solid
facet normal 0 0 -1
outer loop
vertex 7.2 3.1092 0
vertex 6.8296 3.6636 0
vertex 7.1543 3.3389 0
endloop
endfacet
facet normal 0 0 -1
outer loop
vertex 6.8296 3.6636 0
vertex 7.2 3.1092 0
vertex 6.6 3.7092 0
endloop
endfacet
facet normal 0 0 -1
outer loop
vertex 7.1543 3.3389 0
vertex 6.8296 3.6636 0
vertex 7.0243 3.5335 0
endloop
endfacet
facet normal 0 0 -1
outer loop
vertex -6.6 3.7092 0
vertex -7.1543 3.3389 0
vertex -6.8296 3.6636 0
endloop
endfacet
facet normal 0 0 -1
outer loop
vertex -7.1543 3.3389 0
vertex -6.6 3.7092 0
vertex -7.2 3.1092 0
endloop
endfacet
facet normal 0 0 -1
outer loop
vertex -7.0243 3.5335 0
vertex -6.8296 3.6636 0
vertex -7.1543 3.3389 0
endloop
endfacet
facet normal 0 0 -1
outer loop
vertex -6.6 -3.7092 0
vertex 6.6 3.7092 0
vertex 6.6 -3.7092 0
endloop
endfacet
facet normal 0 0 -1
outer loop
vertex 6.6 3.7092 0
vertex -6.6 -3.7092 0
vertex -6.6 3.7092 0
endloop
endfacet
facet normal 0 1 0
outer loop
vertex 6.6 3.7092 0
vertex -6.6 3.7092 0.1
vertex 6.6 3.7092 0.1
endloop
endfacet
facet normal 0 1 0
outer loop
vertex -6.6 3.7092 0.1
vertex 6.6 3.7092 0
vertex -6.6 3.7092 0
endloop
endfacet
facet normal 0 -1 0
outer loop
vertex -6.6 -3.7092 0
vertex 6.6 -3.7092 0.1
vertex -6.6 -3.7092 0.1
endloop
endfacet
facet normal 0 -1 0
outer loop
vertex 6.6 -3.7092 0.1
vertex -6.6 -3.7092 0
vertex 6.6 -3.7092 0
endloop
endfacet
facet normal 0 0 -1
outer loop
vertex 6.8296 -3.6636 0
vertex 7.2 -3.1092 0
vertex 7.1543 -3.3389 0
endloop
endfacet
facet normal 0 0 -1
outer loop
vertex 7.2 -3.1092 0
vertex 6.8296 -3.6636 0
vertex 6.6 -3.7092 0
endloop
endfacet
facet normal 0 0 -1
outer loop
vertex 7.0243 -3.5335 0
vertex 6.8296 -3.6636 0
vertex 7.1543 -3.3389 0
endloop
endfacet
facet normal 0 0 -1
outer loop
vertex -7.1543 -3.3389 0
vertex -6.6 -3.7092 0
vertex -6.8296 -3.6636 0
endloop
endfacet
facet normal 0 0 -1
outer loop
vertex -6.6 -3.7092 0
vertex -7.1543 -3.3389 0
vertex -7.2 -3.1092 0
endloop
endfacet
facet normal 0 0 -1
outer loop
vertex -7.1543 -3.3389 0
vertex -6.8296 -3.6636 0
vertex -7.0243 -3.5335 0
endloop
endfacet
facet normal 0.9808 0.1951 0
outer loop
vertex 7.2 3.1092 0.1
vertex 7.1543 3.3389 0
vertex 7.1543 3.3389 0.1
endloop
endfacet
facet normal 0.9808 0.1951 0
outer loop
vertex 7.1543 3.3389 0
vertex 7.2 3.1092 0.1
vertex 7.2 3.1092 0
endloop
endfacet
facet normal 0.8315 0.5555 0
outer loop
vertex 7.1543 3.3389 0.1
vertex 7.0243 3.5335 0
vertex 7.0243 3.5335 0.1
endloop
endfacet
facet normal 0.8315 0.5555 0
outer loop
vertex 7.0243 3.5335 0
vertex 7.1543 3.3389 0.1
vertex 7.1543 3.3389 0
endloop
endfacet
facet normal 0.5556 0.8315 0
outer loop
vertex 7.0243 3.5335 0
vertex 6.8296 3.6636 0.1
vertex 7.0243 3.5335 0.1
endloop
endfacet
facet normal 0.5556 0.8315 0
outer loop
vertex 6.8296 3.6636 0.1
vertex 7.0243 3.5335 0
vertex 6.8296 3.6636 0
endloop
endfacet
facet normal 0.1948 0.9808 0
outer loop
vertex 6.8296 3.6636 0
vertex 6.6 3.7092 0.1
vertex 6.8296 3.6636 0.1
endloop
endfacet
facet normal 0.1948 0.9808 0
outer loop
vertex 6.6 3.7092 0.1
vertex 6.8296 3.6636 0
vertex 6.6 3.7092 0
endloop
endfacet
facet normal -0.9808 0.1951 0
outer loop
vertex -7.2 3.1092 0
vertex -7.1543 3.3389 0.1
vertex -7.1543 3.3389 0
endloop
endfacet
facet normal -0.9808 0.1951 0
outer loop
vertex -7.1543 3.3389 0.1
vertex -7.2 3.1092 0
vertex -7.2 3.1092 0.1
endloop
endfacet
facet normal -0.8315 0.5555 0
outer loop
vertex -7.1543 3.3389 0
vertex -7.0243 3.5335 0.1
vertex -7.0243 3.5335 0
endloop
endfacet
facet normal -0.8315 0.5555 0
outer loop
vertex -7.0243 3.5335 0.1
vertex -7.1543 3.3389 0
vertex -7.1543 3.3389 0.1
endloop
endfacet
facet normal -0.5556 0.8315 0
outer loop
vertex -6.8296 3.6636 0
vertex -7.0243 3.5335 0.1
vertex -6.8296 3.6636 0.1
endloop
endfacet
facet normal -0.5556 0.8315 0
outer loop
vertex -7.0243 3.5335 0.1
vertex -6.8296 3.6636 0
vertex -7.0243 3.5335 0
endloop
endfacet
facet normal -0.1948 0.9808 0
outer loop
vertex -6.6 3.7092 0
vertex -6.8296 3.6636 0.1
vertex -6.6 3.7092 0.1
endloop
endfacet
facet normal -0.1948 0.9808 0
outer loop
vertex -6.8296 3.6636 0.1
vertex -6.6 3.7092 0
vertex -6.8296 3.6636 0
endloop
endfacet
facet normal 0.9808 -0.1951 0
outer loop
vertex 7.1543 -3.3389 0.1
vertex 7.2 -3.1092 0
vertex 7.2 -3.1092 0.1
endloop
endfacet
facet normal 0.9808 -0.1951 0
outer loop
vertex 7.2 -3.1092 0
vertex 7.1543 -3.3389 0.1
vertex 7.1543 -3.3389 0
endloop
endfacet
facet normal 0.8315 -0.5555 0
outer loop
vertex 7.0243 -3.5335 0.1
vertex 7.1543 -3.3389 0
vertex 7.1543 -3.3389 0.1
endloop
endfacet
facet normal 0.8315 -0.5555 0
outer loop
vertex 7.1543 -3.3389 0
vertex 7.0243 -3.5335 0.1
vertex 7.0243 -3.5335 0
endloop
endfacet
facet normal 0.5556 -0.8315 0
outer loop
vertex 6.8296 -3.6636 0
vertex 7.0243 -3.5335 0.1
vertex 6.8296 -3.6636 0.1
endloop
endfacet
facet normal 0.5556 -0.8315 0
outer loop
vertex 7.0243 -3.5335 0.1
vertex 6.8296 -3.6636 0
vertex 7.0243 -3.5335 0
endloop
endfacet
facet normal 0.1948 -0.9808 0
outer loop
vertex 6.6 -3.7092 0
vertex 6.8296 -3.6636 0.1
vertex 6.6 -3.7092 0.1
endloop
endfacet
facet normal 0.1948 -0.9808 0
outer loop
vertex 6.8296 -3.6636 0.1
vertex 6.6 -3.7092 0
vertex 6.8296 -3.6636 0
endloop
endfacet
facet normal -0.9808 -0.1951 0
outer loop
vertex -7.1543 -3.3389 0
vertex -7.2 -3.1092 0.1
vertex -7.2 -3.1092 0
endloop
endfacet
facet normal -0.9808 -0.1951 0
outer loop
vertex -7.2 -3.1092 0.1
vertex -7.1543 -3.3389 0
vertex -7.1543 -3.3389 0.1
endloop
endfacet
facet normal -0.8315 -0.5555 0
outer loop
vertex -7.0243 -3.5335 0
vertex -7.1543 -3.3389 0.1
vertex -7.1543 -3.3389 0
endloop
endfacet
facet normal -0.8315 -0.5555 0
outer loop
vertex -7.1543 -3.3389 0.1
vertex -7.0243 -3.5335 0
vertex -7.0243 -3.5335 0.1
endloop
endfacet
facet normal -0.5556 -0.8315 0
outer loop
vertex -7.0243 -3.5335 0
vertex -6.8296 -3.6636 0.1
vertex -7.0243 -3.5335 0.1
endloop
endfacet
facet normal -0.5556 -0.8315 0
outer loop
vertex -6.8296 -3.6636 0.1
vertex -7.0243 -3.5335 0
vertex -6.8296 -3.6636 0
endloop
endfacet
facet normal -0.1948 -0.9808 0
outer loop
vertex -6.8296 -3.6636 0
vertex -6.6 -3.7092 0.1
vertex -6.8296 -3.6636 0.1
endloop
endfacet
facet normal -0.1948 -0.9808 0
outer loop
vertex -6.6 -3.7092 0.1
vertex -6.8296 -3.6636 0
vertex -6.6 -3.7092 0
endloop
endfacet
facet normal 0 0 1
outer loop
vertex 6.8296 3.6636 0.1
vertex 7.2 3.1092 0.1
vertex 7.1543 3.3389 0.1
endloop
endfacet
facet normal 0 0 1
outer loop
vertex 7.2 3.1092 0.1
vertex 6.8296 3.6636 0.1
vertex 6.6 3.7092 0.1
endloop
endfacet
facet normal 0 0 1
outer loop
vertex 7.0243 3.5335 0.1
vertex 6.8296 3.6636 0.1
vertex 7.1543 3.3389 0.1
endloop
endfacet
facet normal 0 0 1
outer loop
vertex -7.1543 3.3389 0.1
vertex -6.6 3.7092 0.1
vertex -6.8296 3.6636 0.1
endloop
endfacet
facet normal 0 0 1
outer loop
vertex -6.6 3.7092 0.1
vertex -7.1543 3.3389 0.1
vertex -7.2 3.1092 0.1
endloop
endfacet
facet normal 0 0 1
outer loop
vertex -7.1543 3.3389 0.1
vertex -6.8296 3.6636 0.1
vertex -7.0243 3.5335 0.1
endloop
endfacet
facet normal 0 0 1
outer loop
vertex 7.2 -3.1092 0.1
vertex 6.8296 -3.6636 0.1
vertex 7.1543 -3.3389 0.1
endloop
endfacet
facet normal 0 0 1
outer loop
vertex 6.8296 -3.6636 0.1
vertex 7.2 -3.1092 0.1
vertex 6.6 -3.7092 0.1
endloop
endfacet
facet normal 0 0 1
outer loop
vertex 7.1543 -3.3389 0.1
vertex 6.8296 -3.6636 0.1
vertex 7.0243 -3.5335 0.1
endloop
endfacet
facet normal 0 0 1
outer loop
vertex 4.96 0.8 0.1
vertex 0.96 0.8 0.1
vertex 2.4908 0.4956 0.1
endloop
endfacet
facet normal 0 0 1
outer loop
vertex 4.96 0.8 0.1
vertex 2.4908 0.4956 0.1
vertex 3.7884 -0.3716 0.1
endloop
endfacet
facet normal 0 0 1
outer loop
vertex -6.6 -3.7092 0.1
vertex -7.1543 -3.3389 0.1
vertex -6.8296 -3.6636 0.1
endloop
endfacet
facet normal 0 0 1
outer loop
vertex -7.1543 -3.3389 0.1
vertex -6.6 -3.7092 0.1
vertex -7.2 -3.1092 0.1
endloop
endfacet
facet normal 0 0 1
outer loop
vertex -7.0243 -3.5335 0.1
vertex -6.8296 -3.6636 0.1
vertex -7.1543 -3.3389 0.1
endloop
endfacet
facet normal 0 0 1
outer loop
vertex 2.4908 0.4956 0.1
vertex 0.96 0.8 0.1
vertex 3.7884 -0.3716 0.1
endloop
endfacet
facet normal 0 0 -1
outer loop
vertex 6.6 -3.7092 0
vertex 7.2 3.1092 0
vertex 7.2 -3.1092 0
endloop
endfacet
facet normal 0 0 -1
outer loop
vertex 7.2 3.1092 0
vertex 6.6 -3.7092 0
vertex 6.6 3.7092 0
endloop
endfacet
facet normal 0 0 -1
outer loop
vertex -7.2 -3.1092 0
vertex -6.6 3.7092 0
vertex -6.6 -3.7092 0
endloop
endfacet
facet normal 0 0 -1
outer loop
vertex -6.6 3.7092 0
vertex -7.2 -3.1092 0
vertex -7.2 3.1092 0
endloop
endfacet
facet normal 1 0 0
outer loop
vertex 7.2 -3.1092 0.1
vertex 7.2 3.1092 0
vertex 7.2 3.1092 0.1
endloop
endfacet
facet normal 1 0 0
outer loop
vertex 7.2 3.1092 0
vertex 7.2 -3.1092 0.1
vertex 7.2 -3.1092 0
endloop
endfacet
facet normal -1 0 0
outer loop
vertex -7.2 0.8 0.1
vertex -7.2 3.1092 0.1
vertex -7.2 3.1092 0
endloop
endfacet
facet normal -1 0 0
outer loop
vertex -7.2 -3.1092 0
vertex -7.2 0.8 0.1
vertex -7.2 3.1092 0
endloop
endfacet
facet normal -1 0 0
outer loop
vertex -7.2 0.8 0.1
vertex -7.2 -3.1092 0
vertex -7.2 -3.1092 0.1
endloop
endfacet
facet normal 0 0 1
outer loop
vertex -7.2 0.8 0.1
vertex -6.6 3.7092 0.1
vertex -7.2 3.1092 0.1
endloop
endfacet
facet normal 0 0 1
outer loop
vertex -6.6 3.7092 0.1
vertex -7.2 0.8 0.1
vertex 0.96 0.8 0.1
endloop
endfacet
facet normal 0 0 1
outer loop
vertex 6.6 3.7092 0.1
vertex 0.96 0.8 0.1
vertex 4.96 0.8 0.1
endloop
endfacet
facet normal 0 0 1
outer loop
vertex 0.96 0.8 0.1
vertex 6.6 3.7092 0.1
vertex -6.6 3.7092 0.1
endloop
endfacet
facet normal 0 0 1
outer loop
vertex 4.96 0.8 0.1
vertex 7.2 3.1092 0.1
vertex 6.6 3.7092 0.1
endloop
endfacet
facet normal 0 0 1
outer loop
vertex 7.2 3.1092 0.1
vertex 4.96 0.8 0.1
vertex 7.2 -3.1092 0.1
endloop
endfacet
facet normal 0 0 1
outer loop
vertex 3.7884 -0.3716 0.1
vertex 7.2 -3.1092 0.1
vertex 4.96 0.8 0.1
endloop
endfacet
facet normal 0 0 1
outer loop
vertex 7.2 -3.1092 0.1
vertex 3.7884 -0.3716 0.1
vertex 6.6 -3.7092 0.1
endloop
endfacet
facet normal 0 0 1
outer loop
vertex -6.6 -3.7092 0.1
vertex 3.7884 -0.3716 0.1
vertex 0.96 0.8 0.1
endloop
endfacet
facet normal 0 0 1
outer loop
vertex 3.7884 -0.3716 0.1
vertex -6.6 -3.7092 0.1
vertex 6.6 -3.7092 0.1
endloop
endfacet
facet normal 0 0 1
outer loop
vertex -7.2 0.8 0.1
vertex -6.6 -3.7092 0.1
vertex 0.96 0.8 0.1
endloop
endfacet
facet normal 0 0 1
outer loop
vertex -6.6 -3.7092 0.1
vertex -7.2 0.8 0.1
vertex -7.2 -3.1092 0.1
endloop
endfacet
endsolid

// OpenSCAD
// file: ../p/box3u12.scad
use <../lib.scad>
function ldraw_lib__box3u12() = [
// 0 Box with 3 Parallel Faces without Any Edges
// 0 Name: box3u12.dat
// 0 Author: J.C. Tchang [tchang]
// 0 !LDRAW_ORG Primitive UPDATE 2014-02
// 0 !LICENSE Licensed under CC BY 4.0 : see CAreadme.txt
// 
// 0 BFC CERTIFY CCW
  [0,"BFC","CERTIFY"],
  [0,"BFC","CCW"],
// 
// 0 !HISTORY 2014-12-23 [PTadmin] Official Update 2014-02
// 
// 
// 4 16 -1 1 1 1 1 1 1 1 -1 -1 1 -1
  [4,16,-1,1,1,1,1,1,1,1,-1,-1,1,-1],
// 4 16 -1 1 1 -1 0 1 1 0 1 1 1 1
  [4,16,-1,1,1,-1,0,1,1,0,1,1,1,1],
// 4 16 1 1 -1 1 0 -1 -1 0 -1 -1 1 -1
  [4,16,1,1,-1,1,0,-1,-1,0,-1,-1,1,-1],
];
module ldraw_lib__box3u12(step=0, col=false, unit=2/5, alt=false, line=0.2, solid=!$preview)
    makepoly(ldraw_lib__box3u12(), step=step, col=col, unit=unit, alt=alt, line=line, solid=solid);
ldraw_lib__box3u12(line=0.2);
// file: ../p/1-8ndis.scad
use <../lib.scad>
function ldraw_lib__1_8ndis() = [
// 0 Disc Negative 0.125
// 0 Name: 1-8ndis.dat
// 0 Author: James Jessiman
// 0 !LDRAW_ORG Primitive UPDATE 2012-01
// 0 !LICENSE Licensed under CC BY 4.0 : see CAreadme.txt
// 
// 0 BFC CERTIFY CCW
  [0,"BFC","CERTIFY"],
  [0,"BFC","CCW"],
// 
// 0 !HISTORY 2002-03-23 [sbliss] Added BFC statement
// 0 !HISTORY 2002-04-25 [PTadmin] Official Update 2002-02
// 0 !HISTORY 2007-06-22 [PTadmin] Header formatted for Contributor Agreement
// 0 !HISTORY 2008-07-01 [PTadmin] Official Update 2008-01
// 0 !HISTORY 2012-02-16 [Philo] Changed to CCW
// 0 !HISTORY 2012-03-30 [PTadmin] Official Update 2012-01
// 
// 
// 3 16 0.9239 0 0.3827 1 0 0 1 0 1
  [3,16,0.9239,0,0.3827,1,0,0,1,0,1],
// 3 16 0.7071 0 0.7071 0.9239 0 0.3827 1 0 1
  [3,16,0.7071,0,0.7071,0.9239,0,0.3827,1,0,1],
];
module ldraw_lib__1_8ndis(step=0, col=false, unit=2/5, alt=false, line=0.2, solid=!$preview)
    makepoly(ldraw_lib__1_8ndis(), step=step, col=col, unit=unit, alt=alt, line=line, solid=solid);
ldraw_lib__1_8ndis(line=0.2);
// file: ../p/1-8chrd.scad
use <../lib.scad>
function ldraw_lib__1_8chrd() = [
// 0 Chord 0.125
// 0 Name: 1-8chrd.dat
// 0 Author: Orion Pobursky [OrionP]
// 0 !LDRAW_ORG Primitive UPDATE 2023-05
// 0 !LICENSE Licensed under CC BY 4.0 : see CAreadme.txt
// 
// 0 BFC CERTIFY CCW
  [0,"BFC","CERTIFY"],
  [0,"BFC","CCW"],
// 
// 0 !HISTORY 2004-04-22 [PTadmin] Official Update 2004-02
// 0 !HISTORY 2007-06-22 [PTadmin] Header formatted for Contributor Agreement
// 0 !HISTORY 2008-07-01 [PTadmin] Official Update 2008-01
// 0 !HISTORY 2023-10-27 [OrionP] Rebuilt with PrimGen2, original author westrate
// 0 !HISTORY 2023-10-31 [OrionP] Official Update 2023-05
// 
// 3 16 1 0 0 0.9239 0 0.3827 0.7071 0 0.7071
  [3,16,1,0,0,0.9239,0,0.3827,0.7071,0,0.7071],
];
module ldraw_lib__1_8chrd(step=0, col=false, unit=2/5, alt=false, line=0.2, solid=!$preview)
    makepoly(ldraw_lib__1_8chrd(), step=step, col=col, unit=unit, alt=alt, line=line, solid=solid);
ldraw_lib__1_8chrd(line=0.2);
// file: ../p/1-4cyli.scad
use <../lib.scad>
function ldraw_lib__1_4cyli() = [
// 0 Cylinder 0.25
// 0 Name: 1-4cyli.dat
// 0 Author: James Jessiman
// 0 !LDRAW_ORG Primitive UPDATE 2012-01
// 0 !LICENSE Licensed under CC BY 4.0 : see CAreadme.txt
// 
// 0 BFC CERTIFY CCW
  [0,"BFC","CERTIFY"],
  [0,"BFC","CCW"],
// 
// 0 !HISTORY 2002-03-23 [sbliss] Added BFC statement.
// 0 !HISTORY 2002-04-25 [PTadmin] Official Update 2002-02
// 0 !HISTORY 2007-06-22 [PTadmin] Header formatted for Contributor Agreement
// 0 !HISTORY 2008-07-01 [PTadmin] Official Update 2008-01
// 0 !HISTORY 2012-02-16 [Philo] Changed to CCW
// 0 !HISTORY 2012-03-30 [PTadmin] Official Update 2012-01
// 
// 
// 4 16 1 1 0 0.9239 1 0.3827 0.9239 0 0.3827 1 0 0
  [4,16,1,1,0,0.9239,1,0.3827,0.9239,0,0.3827,1,0,0],
// 5 24 1 0 0 1 1 0 0.9239 0 0.3827 1 0 -1
  [5,24,1,0,0,1,1,0,0.9239,0,0.3827,1,0,-1],
// 4 16 0.9239 1 0.3827 0.7071 1 0.7071 0.7071 0 0.7071 0.9239 0 0.3827
  [4,16,0.9239,1,0.3827,0.7071,1,0.7071,0.7071,0,0.7071,0.9239,0,0.3827],
// 5 24 0.9239 0 0.3827 0.9239 1 0.3827 0.7071 0 0.7071 1 0 0
  [5,24,0.9239,0,0.3827,0.9239,1,0.3827,0.7071,0,0.7071,1,0,0],
// 4 16 0.7071 1 0.7071 0.3827 1 0.9239 0.3827 0 0.9239 0.7071 0 0.7071
  [4,16,0.7071,1,0.7071,0.3827,1,0.9239,0.3827,0,0.9239,0.7071,0,0.7071],
// 5 24 0.7071 0 0.7071 0.7071 1 0.7071 0.3827 0 0.9239 0.9239 0 0.3827
  [5,24,0.7071,0,0.7071,0.7071,1,0.7071,0.3827,0,0.9239,0.9239,0,0.3827],
// 4 16 0.3827 1 0.9239 0 1 1 0 0 1 0.3827 0 0.9239
  [4,16,0.3827,1,0.9239,0,1,1,0,0,1,0.3827,0,0.9239],
// 5 24 0.3827 0 0.9239 0.3827 1 0.9239 0 0 1 0.7071 0 0.7071
  [5,24,0.3827,0,0.9239,0.3827,1,0.9239,0,0,1,0.7071,0,0.7071],
// 5 24 0 0 1 0 1 1 0.3827 0 0.9239 -1 0 1
  [5,24,0,0,1,0,1,1,0.3827,0,0.9239,-1,0,1],
];
module ldraw_lib__1_4cyli(step=0, col=false, unit=2/5, alt=false, line=0.2, solid=!$preview)
    makepoly(ldraw_lib__1_4cyli(), step=step, col=col, unit=unit, alt=alt, line=line, solid=solid);
ldraw_lib__1_4cyli(line=0.2);
// file: ../p/1-4chrd.scad
use <../lib.scad>
function ldraw_lib__1_4chrd() = [
// 0 Chord 0.25
// 0 Name: 1-4chrd.dat
// 0 Author: Max Martin Richter [MMR1988]
// 0 !LDRAW_ORG Primitive UPDATE 2023-05
// 0 !LICENSE Licensed under CC BY 4.0 : see CAreadme.txt
// 
// 0 BFC CERTIFY CCW
  [0,"BFC","CERTIFY"],
  [0,"BFC","CCW"],
// 
// 0 !HISTORY 2004-04-22 [PTadmin] Official Update 2004-02
// 0 !HISTORY 2007-10-09 [PTadmin] Header formatted for Contributor Agreement
// 0 !HISTORY 2008-07-01 [PTadmin] Official Update 2008-01
// 0 !HISTORY 2012-08-02 [MMR1988] Re-creation with PrimGen2 and Rectifier
// 0 !HISTORY 2012-08-09 [PTadmin] Official Update 2012-02
// 0 !HISTORY 2023-10-27 [OrionP] Change author to MMR1988 from hafhead
// 0 !HISTORY 2023-10-31 [OrionP] Official Update 2023-05
// 
// 4 16 0.9239 0 0.3827 0.3827 0 0.9239 0 0 1 1 0 0
  [4,16,0.9239,0,0.3827,0.3827,0,0.9239,0,0,1,1,0,0],
// 3 16 0.7071 0 0.7071 0.3827 0 0.9239 0.9239 0 0.3827
  [3,16,0.7071,0,0.7071,0.3827,0,0.9239,0.9239,0,0.3827],
];
module ldraw_lib__1_4chrd(step=0, col=false, unit=2/5, alt=false, line=0.2, solid=!$preview)
    makepoly(ldraw_lib__1_4chrd(), step=step, col=col, unit=unit, alt=alt, line=line, solid=solid);
ldraw_lib__1_4chrd(line=0.2);
// file: 6177741r.scad
use <../lib.scad>
use <../p/1-4chrd.scad>
use <../p/1-4cyli.scad>
use <../p/1-8chrd.scad>
use <../p/1-8ndis.scad>
use <../p/box3u12.scad>
function ldraw_lib__6177741r() = [
// 0 Sticker  0.9 x  1.8 with Black Trapezoid on Transparent Background Right
// 0 Name: 6177741r.dat
// 0 Author: Massimo Maso [Sirio]
// 0 !LDRAW_ORG Part UPDATE 2025-05
// 0 !LICENSE Licensed under CC BY 4.0 : see CAreadme.txt
// 
// 0 BFC CERTIFY CCW
  [0,"BFC","CERTIFY"],
  [0,"BFC","CCW"],
// 
// 0 !KEYWORDS AMG, GT3, Mercedes, Set 75877, Speed Champions
// 
// 0 !HISTORY 2025-05-28 [OrionP] Official Update 2025-05
// 
// 
// 0 // Primitives
// 
// 1 16 -16.5 0 7.7731 -1.5 0 0 0 -1 0 0 0 1.5 1-4chrd.dat
  [1,16,-16.5,0,7.7731,-1.5,0,0,0,-1,0,0,0,1.5, ldraw_lib__1_4chrd()],
// 1 16 16.5 0 7.7731 1.5 0 0 0 -1 0 0 0 1.5 1-4chrd.dat
  [1,16,16.5,0,7.7731,1.5,0,0,0,-1,0,0,0,1.5, ldraw_lib__1_4chrd()],
// 1 16 0 -.25 0 16.5 0 0 0 .25 0 0 0 9.2731 box3u12.dat
  [1,16,0,-.25,0,16.5,0,0,0,.25,0,0,0,9.2731, ldraw_lib__box3u12()],
// 1 16 -16.5 0 -7.7731 -1.5 0 0 0 -1 0 0 0 -1.5 1-4chrd.dat
  [1,16,-16.5,0,-7.7731,-1.5,0,0,0,-1,0,0,0,-1.5, ldraw_lib__1_4chrd()],
// 1 16 16.5 0 -7.7731 1.5 0 0 0 -1 0 0 0 -1.5 1-4chrd.dat
  [1,16,16.5,0,-7.7731,1.5,0,0,0,-1,0,0,0,-1.5, ldraw_lib__1_4chrd()],
// 1 16 -16.5 0 7.7731 -1.5 0 0 0 -.25 0 0 0 1.5 1-4cyli.dat
  [1,16,-16.5,0,7.7731,-1.5,0,0,0,-.25,0,0,0,1.5, ldraw_lib__1_4cyli()],
// 1 16 16.5 0 7.7731 1.5 0 0 0 -.25 0 0 0 1.5 1-4cyli.dat
  [1,16,16.5,0,7.7731,1.5,0,0,0,-.25,0,0,0,1.5, ldraw_lib__1_4cyli()],
// 1 16 -16.5 0 -7.7731 -1.5 0 0 0 -.25 0 0 0 -1.5 1-4cyli.dat
  [1,16,-16.5,0,-7.7731,-1.5,0,0,0,-.25,0,0,0,-1.5, ldraw_lib__1_4cyli()],
// 1 16 16.5 0 -7.7731 1.5 0 0 0 -.25 0 0 0 -1.5 1-4cyli.dat
  [1,16,16.5,0,-7.7731,1.5,0,0,0,-.25,0,0,0,-1.5, ldraw_lib__1_4cyli()],
// 1 16 -16.5 -.25 7.7731 -1.5 0 0 0 1 0 0 0 1.5 1-4chrd.dat
  [1,16,-16.5,-.25,7.7731,-1.5,0,0,0,1,0,0,0,1.5, ldraw_lib__1_4chrd()],
// 1 16 16.5 -.25 7.7731 1.5 0 0 0 1 0 0 0 1.5 1-4chrd.dat
  [1,16,16.5,-.25,7.7731,1.5,0,0,0,1,0,0,0,1.5, ldraw_lib__1_4chrd()],
// 1 16 -16.5 -.25 -7.7731 -1.5 0 0 0 1 0 0 0 -1.5 1-4chrd.dat
  [1,16,-16.5,-.25,-7.7731,-1.5,0,0,0,1,0,0,0,-1.5, ldraw_lib__1_4chrd()],
// 1 16 -2.4 -.25 -8 0 0 -10 0 1 0 10 0 0 1-8ndis.dat
  [1,16,-2.4,-.25,-8,0,0,-10,0,1,0,10,0,0, ldraw_lib__1_8ndis()],
// 0 BFC NOCLIP
  [0,"BFC","NOCLIP"],
// 1 0 16.5 -.25 -7.7731 1.5 0 0 0 1 0 0 0 -1.5 1-4chrd.dat
  [1,0,16.5,-.25,-7.7731,1.5,0,0,0,1,0,0,0,-1.5, ldraw_lib__1_4chrd()],
// 1 0 -2.4 -.25 -8 0 0 -10 0 1 0 10 0 0 1-8chrd.dat
  [1,0,-2.4,-.25,-8,0,0,-10,0,1,0,10,0,0, ldraw_lib__1_8chrd()],
// 0 BFC CLIP
  [0,"BFC","CLIP"],
// 0 // Bottom faces
// 4 16 -16.5 0 9.2731 -16.5 0 -9.2731 -18 0 -7.7731 -18 0 7.7731
  [4,16,-16.5,0,9.2731,-16.5,0,-9.2731,-18,0,-7.7731,-18,0,7.7731],
// 4 16 16.5 0 9.2731 18 0 7.7731 18 0 -7.7731 16.5 0 -9.2731
  [4,16,16.5,0,9.2731,18,0,7.7731,18,0,-7.7731,16.5,0,-9.2731],
// 0 // Lateral faces
// 4 16 -18 0 7.7731 -18 0 -7.7731 -18 -.25 -7.7731 -18 -.25 7.7731
  [4,16,-18,0,7.7731,-18,0,-7.7731,-18,-.25,-7.7731,-18,-.25,7.7731],
// 3 16 18 0 7.7731 18 -.25 7.7731 18 -.25 2
  [3,16,18,0,7.7731,18,-.25,7.7731,18,-.25,2],
// 4 16 18 0 7.7731 18 -.25 2 18 -.25 -7.7731 18 0 -7.7731
  [4,16,18,0,7.7731,18,-.25,2,18,-.25,-7.7731,18,0,-7.7731],
// 0 // Top faces
// 0 // Trasparent faces
// 4 16 -2.4 -.25 2 18 -.25 2 18 -.25 7.7731 16.5 -.25 9.2731
  [4,16,-2.4,-.25,2,18,-.25,2,18,-.25,7.7731,16.5,-.25,9.2731],
// 4 16 -12.4 -.25 2 -2.4 -.25 2 16.5 -.25 9.2731 -16.5 -.25 9.2731
  [4,16,-12.4,-.25,2,-2.4,-.25,2,16.5,-.25,9.2731,-16.5,-.25,9.2731],
// 4 16 -12.4 -.25 2 -16.5 -.25 9.2731 -18 -.25 7.7731 -18 -.25 -7.7731
  [4,16,-12.4,-.25,2,-16.5,-.25,9.2731,-18,-.25,7.7731,-18,-.25,-7.7731],
// 4 16 -12.4 -.25 2 -18 -.25 -7.7731 -16.5 -.25 -9.2731 -9.471 -.25 -.929
  [4,16,-12.4,-.25,2,-18,-.25,-7.7731,-16.5,-.25,-9.2731,-9.471,-.25,-.929],
// 0 BFC NOCLIP
  [0,"BFC","NOCLIP"],
// 0 // Black faces
// 4 0 -2.4 -.25 2 -9.471 -.25 -.929 -16.5 -.25 -9.2731 16.5 -.25 -9.2731
  [4,0,-2.4,-.25,2,-9.471,-.25,-.929,-16.5,-.25,-9.2731,16.5,-.25,-9.2731],
// 4 0 -2.4 -.25 2 16.5 -.25 -9.2731 18 -.25 -7.7731 18 -.25 2
  [4,0,-2.4,-.25,2,16.5,-.25,-9.2731,18,-.25,-7.7731,18,-.25,2],
];
module ldraw_lib__6177741r(step=0, col=false, unit=2/5, alt=false, line=0.2, solid=!$preview)
    makepoly(ldraw_lib__6177741r(), step=step, col=col, unit=unit, alt=alt, line=line, solid=solid);
ldraw_lib__6177741r(line=0.2);
// main file
use <../lib.scad>
use <6177741r.scad>
function ldraw_lib__6177741u() = [
// 0 Sticker  0.9 x  1.8 with Black Trapezoid on Transparent Background Left
// 0 Name: 6177741u.dat
// 0 Author: Massimo Maso [Sirio]
// 0 !LDRAW_ORG Part UPDATE 2025-05
// 0 !LICENSE Licensed under CC BY 4.0 : see CAreadme.txt
// 
// 0 BFC CERTIFY CCW
  [0,"BFC","CERTIFY"],
  [0,"BFC","CCW"],
// 
// 0 !KEYWORDS AMG, GT3, Mercedes, Set 75877, Speed Champions
// 
// 0 !HISTORY 2025-05-28 [OrionP] Official Update 2025-05
// 
// 
// 1 16 0 0 0 -1 0 0 0 1 0 0 0 1 6177741r.dat
  [1,16,0,0,0,-1,0,0,0,1,0,0,0,1, ldraw_lib__6177741r()],
];
module ldraw_lib__6177741u(step=0, col=false, unit=2/5, alt=false, line=0.2, solid=!$preview)
    makepoly(ldraw_lib__6177741u(), step=step, col=col, unit=unit, alt=alt, line=line, solid=solid);
ldraw_lib__6177741u(line=0.2);
